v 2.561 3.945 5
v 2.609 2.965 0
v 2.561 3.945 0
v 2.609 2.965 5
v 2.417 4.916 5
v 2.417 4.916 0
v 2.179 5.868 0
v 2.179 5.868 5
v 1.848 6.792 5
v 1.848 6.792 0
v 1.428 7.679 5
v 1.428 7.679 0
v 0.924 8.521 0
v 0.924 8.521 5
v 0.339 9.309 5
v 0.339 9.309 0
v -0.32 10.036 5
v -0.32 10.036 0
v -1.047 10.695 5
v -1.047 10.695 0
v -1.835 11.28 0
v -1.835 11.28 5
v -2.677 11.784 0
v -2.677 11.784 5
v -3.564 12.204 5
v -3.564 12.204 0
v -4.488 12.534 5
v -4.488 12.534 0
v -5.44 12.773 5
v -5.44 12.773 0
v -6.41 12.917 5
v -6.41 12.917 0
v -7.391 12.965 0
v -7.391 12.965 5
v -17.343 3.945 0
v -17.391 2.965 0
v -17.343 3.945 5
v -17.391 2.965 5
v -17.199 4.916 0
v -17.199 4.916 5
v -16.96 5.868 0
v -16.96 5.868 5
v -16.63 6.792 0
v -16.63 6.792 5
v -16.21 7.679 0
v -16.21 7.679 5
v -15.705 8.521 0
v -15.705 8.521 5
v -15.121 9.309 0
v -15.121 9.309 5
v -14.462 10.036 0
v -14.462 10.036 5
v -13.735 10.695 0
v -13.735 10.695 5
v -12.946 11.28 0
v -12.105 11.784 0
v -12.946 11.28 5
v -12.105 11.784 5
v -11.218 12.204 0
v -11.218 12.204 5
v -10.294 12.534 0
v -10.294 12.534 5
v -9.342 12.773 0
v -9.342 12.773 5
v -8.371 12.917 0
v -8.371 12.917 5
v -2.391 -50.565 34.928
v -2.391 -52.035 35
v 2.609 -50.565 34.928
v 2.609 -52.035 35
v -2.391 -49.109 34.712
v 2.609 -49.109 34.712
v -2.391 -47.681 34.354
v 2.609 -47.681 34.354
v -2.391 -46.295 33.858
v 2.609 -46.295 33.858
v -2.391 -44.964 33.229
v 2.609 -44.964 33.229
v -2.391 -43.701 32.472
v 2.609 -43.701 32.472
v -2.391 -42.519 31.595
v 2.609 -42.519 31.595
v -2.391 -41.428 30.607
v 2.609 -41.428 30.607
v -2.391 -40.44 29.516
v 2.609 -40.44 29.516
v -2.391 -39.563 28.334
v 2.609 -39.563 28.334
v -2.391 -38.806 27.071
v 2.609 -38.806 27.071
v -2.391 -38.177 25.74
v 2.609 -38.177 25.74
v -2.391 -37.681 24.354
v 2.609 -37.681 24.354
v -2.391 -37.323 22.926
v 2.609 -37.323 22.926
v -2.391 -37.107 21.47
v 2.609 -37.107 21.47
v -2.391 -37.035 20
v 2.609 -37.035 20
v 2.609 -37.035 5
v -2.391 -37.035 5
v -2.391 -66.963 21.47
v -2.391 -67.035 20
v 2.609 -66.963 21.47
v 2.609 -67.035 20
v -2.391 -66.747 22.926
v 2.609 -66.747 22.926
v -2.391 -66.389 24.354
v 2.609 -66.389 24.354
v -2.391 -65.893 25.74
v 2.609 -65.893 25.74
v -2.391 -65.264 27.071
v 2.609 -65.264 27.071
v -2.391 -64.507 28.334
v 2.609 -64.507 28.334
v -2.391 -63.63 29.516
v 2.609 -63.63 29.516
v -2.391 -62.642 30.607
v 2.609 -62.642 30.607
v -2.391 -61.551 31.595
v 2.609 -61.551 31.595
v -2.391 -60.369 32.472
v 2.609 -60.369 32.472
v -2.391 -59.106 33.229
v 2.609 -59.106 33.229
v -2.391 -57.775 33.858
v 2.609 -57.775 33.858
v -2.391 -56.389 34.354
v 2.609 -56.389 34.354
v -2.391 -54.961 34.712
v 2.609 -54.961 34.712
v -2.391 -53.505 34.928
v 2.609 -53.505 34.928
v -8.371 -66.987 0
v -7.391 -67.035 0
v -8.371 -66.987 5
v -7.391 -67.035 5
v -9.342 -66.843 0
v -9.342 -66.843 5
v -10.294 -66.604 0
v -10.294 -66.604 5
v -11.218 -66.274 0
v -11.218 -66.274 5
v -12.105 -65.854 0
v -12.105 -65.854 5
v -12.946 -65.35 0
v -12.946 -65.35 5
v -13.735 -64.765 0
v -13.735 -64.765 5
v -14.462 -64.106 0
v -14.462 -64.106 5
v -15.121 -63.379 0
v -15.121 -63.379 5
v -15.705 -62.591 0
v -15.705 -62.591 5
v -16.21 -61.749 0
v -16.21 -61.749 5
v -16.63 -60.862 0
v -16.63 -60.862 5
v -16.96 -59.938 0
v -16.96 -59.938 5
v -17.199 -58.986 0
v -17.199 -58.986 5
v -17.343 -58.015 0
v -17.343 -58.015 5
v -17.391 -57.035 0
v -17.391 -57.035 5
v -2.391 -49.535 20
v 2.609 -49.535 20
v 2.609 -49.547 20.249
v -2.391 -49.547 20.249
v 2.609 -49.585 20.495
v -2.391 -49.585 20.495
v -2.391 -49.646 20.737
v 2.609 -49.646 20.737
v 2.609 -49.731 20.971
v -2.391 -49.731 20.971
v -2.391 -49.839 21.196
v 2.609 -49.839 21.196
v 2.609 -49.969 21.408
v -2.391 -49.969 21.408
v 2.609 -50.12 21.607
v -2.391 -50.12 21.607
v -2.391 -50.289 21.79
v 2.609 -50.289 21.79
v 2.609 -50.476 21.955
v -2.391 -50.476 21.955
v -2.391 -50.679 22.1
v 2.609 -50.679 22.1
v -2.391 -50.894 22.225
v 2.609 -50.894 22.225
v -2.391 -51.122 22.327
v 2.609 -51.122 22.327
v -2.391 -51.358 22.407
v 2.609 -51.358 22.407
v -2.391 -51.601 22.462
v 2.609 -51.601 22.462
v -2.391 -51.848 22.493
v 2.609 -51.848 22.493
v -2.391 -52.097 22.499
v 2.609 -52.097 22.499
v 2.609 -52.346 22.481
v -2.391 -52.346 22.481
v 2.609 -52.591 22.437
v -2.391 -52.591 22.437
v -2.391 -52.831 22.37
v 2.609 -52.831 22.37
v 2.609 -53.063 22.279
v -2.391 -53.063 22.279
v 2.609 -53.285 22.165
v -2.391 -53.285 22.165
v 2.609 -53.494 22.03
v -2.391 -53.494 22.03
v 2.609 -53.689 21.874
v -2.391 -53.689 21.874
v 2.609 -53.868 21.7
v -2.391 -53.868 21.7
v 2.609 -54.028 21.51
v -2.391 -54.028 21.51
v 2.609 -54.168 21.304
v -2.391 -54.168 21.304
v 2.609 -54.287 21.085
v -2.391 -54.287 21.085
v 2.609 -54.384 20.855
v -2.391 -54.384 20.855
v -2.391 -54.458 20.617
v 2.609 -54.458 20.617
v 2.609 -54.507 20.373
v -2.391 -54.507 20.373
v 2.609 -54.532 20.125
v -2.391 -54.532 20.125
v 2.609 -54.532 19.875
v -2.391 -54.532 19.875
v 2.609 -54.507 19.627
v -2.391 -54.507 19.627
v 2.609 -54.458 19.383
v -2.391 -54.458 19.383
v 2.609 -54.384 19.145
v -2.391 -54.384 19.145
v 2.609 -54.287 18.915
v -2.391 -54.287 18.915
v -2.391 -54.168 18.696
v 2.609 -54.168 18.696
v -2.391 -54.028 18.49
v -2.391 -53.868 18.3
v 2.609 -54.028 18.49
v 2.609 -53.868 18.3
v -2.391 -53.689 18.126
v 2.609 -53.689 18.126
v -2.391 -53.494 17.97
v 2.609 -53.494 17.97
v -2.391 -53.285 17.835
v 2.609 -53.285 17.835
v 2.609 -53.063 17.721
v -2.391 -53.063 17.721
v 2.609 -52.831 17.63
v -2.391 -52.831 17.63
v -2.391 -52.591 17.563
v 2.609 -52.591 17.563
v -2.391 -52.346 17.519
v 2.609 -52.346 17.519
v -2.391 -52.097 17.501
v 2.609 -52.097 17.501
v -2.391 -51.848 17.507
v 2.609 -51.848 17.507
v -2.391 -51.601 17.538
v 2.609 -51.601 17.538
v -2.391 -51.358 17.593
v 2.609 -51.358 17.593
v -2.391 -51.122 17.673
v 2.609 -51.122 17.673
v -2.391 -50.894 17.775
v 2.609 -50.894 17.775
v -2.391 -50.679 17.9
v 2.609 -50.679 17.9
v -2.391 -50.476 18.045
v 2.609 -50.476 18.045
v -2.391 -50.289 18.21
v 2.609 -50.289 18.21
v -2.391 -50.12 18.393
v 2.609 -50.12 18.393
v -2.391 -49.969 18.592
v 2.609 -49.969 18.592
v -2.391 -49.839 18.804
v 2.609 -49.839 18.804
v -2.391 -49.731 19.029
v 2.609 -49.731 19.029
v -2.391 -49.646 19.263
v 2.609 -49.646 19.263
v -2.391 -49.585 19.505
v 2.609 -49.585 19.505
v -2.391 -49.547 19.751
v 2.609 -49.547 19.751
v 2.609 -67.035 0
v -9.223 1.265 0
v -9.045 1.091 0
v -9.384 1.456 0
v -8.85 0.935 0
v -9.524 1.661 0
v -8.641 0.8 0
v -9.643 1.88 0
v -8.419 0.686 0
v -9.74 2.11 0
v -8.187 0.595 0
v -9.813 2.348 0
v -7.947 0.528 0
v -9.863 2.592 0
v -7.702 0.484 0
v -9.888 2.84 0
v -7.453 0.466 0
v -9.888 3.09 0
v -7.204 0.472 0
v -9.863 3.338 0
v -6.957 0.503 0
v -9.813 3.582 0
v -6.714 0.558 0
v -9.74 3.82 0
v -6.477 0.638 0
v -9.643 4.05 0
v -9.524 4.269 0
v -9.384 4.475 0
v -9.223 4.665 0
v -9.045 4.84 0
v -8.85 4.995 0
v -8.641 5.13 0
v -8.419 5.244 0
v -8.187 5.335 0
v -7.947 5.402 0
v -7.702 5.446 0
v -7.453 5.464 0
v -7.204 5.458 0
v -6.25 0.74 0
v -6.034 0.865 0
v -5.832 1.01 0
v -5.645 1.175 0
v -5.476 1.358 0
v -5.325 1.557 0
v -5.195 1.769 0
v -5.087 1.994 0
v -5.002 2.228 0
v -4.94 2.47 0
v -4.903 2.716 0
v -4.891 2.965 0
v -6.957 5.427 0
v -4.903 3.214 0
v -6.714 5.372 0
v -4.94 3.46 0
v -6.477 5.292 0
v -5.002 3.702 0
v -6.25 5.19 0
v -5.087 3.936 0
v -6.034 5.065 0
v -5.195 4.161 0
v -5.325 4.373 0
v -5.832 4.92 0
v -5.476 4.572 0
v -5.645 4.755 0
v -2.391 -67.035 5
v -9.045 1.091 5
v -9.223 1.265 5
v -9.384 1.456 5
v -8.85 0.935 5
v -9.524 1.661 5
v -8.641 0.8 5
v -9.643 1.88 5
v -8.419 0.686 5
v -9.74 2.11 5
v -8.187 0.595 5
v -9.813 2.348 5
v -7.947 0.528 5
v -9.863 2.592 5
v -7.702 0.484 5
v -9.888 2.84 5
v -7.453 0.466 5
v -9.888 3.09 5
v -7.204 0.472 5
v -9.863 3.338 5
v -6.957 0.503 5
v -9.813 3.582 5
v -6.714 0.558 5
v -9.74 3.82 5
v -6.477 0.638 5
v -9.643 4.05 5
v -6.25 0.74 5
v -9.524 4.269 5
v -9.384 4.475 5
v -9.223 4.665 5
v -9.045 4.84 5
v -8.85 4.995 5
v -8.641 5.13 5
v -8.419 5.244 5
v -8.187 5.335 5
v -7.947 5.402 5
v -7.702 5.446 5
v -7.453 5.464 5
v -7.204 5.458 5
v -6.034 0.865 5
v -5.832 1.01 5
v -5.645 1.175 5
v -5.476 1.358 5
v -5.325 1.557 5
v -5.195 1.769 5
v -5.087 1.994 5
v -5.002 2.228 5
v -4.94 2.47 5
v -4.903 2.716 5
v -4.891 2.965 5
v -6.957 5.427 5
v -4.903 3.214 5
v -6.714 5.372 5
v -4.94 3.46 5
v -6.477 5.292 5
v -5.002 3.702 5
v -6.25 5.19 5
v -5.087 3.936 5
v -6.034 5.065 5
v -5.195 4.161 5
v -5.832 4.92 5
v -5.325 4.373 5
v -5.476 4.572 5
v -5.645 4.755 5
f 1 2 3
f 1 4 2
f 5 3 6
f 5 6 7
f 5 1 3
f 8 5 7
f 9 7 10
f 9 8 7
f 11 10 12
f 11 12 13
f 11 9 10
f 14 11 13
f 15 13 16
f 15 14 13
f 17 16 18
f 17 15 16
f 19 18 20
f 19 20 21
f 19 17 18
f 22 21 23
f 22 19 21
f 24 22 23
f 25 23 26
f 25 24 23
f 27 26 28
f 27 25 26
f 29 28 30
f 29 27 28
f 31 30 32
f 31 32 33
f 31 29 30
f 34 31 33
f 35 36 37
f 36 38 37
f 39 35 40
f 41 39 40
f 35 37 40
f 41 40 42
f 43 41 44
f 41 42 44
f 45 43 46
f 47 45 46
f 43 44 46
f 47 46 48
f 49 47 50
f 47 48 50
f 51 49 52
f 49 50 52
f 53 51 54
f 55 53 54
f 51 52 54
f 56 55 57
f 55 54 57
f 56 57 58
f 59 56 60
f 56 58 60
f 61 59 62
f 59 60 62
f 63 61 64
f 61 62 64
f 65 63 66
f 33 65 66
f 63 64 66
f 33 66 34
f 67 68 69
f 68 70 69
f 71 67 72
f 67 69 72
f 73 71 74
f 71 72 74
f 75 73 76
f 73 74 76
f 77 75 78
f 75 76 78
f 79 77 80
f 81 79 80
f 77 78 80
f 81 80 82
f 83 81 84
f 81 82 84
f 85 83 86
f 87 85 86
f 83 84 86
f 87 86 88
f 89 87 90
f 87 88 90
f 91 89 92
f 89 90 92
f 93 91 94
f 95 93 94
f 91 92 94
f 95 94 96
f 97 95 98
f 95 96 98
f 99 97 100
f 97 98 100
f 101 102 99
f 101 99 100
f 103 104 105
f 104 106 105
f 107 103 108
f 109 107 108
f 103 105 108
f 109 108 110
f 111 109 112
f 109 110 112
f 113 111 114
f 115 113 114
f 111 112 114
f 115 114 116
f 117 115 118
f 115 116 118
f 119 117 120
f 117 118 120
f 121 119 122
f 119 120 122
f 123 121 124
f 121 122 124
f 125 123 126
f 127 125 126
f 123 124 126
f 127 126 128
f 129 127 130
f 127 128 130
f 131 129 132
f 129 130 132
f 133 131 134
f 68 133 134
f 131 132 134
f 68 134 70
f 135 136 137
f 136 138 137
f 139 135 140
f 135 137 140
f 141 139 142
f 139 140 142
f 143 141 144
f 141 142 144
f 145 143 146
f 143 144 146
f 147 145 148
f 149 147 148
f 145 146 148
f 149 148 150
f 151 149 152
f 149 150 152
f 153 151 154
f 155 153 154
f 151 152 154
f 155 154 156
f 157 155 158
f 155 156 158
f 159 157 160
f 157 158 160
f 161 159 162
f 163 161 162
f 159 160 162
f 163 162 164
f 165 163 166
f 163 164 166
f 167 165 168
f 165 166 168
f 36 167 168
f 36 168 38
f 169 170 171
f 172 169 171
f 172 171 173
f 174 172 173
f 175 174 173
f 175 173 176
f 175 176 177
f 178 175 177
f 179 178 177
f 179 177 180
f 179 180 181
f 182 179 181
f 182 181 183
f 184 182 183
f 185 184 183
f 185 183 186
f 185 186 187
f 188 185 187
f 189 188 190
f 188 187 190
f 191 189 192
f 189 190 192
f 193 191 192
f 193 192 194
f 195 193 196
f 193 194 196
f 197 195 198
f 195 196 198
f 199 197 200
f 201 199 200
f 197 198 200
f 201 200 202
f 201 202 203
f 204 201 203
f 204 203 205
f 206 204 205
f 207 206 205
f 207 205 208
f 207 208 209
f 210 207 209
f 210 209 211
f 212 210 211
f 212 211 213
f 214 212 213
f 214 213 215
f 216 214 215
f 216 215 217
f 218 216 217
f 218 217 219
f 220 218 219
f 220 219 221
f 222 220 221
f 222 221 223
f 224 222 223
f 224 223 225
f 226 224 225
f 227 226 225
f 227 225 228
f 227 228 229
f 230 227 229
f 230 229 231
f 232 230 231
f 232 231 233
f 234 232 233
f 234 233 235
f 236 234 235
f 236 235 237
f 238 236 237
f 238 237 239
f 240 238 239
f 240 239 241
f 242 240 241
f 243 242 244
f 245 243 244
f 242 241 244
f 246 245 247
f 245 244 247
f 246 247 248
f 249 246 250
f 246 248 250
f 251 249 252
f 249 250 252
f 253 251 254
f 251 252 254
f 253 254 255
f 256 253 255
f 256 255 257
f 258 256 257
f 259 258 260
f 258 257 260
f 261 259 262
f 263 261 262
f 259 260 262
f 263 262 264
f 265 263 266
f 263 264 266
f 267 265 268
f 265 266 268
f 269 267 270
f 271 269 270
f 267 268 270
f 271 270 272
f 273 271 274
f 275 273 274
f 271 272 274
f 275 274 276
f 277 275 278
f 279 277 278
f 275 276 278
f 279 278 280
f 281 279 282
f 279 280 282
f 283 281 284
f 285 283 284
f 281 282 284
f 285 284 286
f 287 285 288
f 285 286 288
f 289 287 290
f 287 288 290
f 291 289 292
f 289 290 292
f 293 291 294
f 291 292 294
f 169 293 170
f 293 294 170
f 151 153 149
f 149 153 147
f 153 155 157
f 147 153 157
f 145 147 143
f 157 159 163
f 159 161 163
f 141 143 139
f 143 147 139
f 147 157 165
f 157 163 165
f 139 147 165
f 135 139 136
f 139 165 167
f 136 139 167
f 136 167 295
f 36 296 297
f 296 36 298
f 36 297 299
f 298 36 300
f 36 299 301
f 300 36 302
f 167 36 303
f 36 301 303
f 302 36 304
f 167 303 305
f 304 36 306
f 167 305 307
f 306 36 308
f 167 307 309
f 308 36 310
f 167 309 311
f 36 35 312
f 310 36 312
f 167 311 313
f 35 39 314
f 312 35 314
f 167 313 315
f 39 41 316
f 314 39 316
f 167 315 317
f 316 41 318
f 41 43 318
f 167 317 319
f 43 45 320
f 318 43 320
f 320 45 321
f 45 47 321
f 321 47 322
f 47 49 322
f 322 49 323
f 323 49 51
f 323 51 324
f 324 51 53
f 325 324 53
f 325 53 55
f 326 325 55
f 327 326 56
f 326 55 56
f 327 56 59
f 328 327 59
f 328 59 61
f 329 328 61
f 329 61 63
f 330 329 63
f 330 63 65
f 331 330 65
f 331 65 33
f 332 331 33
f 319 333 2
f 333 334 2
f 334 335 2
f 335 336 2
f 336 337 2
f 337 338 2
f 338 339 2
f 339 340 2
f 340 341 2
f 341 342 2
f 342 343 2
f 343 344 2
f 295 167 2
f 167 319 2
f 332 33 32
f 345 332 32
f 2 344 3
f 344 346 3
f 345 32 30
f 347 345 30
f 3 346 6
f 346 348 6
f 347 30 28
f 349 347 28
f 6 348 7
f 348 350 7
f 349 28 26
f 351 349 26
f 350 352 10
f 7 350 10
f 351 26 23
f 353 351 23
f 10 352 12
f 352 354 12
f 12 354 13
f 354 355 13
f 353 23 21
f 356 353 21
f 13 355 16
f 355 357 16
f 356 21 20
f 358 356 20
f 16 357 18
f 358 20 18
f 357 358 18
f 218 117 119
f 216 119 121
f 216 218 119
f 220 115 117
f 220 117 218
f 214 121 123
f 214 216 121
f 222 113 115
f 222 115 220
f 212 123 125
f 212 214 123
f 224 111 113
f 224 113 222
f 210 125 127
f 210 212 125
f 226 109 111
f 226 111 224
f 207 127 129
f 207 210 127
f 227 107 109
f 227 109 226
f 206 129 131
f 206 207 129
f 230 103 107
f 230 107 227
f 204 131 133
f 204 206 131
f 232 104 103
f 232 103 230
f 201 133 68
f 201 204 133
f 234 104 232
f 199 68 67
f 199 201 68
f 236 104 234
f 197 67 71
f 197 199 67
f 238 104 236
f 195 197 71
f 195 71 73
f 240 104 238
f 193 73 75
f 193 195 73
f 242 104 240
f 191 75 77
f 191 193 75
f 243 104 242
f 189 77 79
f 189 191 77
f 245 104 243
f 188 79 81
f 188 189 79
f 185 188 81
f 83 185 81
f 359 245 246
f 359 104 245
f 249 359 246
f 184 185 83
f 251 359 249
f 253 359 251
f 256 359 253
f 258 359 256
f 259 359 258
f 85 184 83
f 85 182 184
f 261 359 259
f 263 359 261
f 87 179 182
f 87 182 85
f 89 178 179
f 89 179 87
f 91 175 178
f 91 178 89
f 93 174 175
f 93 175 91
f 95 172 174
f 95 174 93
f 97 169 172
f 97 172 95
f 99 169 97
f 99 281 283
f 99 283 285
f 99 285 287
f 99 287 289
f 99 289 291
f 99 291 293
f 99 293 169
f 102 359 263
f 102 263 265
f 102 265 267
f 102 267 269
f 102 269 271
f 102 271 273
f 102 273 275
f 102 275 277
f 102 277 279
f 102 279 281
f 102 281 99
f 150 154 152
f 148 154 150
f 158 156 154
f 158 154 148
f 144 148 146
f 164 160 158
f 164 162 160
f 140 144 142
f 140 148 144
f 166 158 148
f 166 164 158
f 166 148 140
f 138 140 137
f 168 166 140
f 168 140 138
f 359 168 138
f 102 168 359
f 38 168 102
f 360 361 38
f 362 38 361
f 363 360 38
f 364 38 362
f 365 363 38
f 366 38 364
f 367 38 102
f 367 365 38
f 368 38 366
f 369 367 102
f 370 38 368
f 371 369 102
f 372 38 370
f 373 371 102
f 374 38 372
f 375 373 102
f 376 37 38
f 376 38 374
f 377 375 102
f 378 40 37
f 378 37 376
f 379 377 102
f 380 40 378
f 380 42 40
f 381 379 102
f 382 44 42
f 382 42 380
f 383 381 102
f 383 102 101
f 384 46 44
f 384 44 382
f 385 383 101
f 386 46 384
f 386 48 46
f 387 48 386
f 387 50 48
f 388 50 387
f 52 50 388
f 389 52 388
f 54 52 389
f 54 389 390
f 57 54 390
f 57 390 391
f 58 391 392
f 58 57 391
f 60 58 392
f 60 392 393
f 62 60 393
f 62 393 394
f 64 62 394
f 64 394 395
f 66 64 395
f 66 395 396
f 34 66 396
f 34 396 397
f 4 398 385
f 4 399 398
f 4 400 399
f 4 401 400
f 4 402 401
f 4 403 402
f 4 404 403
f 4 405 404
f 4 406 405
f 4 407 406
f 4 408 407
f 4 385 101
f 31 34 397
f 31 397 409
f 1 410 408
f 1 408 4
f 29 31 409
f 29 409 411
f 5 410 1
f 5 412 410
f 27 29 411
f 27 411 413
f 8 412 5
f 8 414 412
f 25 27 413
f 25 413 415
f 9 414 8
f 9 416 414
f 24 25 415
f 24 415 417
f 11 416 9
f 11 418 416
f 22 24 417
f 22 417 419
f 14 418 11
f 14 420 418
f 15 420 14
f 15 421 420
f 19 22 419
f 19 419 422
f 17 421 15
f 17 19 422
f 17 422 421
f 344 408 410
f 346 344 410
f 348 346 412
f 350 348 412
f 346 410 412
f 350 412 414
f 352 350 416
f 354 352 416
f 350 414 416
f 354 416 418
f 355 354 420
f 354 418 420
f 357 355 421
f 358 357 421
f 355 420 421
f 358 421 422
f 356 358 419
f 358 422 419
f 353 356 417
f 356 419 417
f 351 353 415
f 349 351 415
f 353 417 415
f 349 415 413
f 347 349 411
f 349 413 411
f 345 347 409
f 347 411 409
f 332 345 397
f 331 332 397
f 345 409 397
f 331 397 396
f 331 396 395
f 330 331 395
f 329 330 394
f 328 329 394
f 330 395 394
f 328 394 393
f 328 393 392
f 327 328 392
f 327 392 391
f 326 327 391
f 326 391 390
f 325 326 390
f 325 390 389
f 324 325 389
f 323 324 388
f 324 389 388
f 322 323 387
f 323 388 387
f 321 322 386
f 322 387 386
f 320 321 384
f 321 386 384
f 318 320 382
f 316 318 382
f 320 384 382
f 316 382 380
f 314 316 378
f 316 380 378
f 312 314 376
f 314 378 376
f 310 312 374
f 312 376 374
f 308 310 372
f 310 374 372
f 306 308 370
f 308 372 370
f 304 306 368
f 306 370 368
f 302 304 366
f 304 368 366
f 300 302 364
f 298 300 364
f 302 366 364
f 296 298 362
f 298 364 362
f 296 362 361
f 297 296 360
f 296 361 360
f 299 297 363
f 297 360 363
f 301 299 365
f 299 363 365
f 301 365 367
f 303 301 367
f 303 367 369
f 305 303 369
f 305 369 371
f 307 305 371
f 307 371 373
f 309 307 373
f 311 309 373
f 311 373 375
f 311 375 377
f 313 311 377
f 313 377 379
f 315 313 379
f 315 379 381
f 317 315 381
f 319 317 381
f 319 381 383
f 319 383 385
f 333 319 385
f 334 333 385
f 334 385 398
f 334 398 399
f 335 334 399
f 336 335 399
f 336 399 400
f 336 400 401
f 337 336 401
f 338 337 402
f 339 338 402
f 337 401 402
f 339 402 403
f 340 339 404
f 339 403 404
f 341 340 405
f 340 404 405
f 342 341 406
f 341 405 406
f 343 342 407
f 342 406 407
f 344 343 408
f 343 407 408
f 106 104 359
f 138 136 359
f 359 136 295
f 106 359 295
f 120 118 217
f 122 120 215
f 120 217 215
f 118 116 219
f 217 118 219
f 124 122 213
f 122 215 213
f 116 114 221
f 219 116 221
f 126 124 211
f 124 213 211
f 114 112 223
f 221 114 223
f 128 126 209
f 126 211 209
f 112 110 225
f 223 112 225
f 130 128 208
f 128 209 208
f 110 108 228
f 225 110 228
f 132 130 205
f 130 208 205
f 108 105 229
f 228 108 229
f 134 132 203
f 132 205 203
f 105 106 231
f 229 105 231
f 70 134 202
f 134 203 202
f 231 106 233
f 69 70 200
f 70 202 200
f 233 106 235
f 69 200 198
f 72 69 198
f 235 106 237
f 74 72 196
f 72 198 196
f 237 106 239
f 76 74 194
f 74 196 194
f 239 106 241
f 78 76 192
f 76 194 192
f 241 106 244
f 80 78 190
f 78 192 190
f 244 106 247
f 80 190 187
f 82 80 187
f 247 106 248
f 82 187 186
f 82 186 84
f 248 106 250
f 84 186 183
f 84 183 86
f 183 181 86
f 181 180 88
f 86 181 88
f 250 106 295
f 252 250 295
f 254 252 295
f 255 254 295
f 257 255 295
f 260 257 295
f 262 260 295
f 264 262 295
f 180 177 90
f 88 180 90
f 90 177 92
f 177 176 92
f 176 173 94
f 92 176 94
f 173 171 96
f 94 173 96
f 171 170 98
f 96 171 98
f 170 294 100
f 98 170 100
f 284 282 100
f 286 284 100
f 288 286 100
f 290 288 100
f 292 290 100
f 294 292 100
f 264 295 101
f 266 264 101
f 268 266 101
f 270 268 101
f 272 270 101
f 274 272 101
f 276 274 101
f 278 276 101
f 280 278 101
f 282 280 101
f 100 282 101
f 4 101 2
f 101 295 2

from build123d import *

# Parameters (mm, degrees)
ESQUISSE1_W             = 20
ESQUISSE1_H             = 80
BOSS_EXTRU_1_DEPTH      = 5
ESQUISSE2_R             = 2.5
ENL_V_MAT_EXTRU_1_DEPTH = 5
ESQUISSE3_W             = 5
ESQUISSE3_H             = 30
BOSS_EXTRU_2_DEPTH      = 30
ESQUISSE4_R             = 2.5
ENL_V_MAT_EXTRU_2_DEPTH = 30
CONG_1_R                = 15
CONG_2_R                = 10


with BuildPart() as part:
    # Esquisse1 → Boss.-Extru.1 (new body)
    with BuildSketch(Plane.XY):
        with Locations((-7.390726734, -27.034940778)):
            Rectangle(ESQUISSE1_W, ESQUISSE1_H)
    extrude(amount=BOSS_EXTRU_1_DEPTH)

    # Esquisse2 → Enlèv. mat.-Extru.1 (cut)
    with BuildSketch(Plane.XY.offset(5)):
        with Locations((-7.390726734, 2.965059222)):
            Circle(ESQUISSE2_R)
    extrude(amount=-ENL_V_MAT_EXTRU_1_DEPTH, mode=Mode.SUBTRACT)

    # Esquisse3 → Boss.-Extru.2 (add)
    with BuildSketch(Plane.XY.offset(5)):
        with Locations((0.109273266, -52.034940778)):
            Rectangle(ESQUISSE3_W, ESQUISSE3_H)
    extrude(amount=BOSS_EXTRU_2_DEPTH)

    # Esquisse4 → Enlèv. mat.-Extru.2 (cut)
    with BuildSketch(Plane(origin=(2.609273266, 0, 0), x_dir=(0, 0, -1), z_dir=(1, 0, 0))):
        with Locations(Location((-20, -52.034940778, 0), (0, 0, 90))):
            Circle(ESQUISSE4_R)
    extrude(amount=-ENL_V_MAT_EXTRU_2_DEPTH, mode=Mode.SUBTRACT)

    # Congé1
    cong_1_edges = [part.edges().sort_by_distance(p)[0] for p in [
        (0.109273266, -67.034940778, 35),
        (0.109273266, -37.034940778, 35),
    ]]
    fillet(cong_1_edges, radius=CONG_1_R - 0.0001)  # a hair under: the kernel refuses the full size

    # Congé2
    cong_2_edges = [part.edges().sort_by_distance(p)[0] for p in [
        (-17.390726734, -67.034940778, 2.5),
        (2.609273266, 12.965059222, 2.5),
        (-17.390726734, 12.965059222, 2.5),
    ]]
    fillet(cong_2_edges, radius=CONG_2_R - 0.0001)  # a hair under: the kernel refuses the full size


solid = part.part
